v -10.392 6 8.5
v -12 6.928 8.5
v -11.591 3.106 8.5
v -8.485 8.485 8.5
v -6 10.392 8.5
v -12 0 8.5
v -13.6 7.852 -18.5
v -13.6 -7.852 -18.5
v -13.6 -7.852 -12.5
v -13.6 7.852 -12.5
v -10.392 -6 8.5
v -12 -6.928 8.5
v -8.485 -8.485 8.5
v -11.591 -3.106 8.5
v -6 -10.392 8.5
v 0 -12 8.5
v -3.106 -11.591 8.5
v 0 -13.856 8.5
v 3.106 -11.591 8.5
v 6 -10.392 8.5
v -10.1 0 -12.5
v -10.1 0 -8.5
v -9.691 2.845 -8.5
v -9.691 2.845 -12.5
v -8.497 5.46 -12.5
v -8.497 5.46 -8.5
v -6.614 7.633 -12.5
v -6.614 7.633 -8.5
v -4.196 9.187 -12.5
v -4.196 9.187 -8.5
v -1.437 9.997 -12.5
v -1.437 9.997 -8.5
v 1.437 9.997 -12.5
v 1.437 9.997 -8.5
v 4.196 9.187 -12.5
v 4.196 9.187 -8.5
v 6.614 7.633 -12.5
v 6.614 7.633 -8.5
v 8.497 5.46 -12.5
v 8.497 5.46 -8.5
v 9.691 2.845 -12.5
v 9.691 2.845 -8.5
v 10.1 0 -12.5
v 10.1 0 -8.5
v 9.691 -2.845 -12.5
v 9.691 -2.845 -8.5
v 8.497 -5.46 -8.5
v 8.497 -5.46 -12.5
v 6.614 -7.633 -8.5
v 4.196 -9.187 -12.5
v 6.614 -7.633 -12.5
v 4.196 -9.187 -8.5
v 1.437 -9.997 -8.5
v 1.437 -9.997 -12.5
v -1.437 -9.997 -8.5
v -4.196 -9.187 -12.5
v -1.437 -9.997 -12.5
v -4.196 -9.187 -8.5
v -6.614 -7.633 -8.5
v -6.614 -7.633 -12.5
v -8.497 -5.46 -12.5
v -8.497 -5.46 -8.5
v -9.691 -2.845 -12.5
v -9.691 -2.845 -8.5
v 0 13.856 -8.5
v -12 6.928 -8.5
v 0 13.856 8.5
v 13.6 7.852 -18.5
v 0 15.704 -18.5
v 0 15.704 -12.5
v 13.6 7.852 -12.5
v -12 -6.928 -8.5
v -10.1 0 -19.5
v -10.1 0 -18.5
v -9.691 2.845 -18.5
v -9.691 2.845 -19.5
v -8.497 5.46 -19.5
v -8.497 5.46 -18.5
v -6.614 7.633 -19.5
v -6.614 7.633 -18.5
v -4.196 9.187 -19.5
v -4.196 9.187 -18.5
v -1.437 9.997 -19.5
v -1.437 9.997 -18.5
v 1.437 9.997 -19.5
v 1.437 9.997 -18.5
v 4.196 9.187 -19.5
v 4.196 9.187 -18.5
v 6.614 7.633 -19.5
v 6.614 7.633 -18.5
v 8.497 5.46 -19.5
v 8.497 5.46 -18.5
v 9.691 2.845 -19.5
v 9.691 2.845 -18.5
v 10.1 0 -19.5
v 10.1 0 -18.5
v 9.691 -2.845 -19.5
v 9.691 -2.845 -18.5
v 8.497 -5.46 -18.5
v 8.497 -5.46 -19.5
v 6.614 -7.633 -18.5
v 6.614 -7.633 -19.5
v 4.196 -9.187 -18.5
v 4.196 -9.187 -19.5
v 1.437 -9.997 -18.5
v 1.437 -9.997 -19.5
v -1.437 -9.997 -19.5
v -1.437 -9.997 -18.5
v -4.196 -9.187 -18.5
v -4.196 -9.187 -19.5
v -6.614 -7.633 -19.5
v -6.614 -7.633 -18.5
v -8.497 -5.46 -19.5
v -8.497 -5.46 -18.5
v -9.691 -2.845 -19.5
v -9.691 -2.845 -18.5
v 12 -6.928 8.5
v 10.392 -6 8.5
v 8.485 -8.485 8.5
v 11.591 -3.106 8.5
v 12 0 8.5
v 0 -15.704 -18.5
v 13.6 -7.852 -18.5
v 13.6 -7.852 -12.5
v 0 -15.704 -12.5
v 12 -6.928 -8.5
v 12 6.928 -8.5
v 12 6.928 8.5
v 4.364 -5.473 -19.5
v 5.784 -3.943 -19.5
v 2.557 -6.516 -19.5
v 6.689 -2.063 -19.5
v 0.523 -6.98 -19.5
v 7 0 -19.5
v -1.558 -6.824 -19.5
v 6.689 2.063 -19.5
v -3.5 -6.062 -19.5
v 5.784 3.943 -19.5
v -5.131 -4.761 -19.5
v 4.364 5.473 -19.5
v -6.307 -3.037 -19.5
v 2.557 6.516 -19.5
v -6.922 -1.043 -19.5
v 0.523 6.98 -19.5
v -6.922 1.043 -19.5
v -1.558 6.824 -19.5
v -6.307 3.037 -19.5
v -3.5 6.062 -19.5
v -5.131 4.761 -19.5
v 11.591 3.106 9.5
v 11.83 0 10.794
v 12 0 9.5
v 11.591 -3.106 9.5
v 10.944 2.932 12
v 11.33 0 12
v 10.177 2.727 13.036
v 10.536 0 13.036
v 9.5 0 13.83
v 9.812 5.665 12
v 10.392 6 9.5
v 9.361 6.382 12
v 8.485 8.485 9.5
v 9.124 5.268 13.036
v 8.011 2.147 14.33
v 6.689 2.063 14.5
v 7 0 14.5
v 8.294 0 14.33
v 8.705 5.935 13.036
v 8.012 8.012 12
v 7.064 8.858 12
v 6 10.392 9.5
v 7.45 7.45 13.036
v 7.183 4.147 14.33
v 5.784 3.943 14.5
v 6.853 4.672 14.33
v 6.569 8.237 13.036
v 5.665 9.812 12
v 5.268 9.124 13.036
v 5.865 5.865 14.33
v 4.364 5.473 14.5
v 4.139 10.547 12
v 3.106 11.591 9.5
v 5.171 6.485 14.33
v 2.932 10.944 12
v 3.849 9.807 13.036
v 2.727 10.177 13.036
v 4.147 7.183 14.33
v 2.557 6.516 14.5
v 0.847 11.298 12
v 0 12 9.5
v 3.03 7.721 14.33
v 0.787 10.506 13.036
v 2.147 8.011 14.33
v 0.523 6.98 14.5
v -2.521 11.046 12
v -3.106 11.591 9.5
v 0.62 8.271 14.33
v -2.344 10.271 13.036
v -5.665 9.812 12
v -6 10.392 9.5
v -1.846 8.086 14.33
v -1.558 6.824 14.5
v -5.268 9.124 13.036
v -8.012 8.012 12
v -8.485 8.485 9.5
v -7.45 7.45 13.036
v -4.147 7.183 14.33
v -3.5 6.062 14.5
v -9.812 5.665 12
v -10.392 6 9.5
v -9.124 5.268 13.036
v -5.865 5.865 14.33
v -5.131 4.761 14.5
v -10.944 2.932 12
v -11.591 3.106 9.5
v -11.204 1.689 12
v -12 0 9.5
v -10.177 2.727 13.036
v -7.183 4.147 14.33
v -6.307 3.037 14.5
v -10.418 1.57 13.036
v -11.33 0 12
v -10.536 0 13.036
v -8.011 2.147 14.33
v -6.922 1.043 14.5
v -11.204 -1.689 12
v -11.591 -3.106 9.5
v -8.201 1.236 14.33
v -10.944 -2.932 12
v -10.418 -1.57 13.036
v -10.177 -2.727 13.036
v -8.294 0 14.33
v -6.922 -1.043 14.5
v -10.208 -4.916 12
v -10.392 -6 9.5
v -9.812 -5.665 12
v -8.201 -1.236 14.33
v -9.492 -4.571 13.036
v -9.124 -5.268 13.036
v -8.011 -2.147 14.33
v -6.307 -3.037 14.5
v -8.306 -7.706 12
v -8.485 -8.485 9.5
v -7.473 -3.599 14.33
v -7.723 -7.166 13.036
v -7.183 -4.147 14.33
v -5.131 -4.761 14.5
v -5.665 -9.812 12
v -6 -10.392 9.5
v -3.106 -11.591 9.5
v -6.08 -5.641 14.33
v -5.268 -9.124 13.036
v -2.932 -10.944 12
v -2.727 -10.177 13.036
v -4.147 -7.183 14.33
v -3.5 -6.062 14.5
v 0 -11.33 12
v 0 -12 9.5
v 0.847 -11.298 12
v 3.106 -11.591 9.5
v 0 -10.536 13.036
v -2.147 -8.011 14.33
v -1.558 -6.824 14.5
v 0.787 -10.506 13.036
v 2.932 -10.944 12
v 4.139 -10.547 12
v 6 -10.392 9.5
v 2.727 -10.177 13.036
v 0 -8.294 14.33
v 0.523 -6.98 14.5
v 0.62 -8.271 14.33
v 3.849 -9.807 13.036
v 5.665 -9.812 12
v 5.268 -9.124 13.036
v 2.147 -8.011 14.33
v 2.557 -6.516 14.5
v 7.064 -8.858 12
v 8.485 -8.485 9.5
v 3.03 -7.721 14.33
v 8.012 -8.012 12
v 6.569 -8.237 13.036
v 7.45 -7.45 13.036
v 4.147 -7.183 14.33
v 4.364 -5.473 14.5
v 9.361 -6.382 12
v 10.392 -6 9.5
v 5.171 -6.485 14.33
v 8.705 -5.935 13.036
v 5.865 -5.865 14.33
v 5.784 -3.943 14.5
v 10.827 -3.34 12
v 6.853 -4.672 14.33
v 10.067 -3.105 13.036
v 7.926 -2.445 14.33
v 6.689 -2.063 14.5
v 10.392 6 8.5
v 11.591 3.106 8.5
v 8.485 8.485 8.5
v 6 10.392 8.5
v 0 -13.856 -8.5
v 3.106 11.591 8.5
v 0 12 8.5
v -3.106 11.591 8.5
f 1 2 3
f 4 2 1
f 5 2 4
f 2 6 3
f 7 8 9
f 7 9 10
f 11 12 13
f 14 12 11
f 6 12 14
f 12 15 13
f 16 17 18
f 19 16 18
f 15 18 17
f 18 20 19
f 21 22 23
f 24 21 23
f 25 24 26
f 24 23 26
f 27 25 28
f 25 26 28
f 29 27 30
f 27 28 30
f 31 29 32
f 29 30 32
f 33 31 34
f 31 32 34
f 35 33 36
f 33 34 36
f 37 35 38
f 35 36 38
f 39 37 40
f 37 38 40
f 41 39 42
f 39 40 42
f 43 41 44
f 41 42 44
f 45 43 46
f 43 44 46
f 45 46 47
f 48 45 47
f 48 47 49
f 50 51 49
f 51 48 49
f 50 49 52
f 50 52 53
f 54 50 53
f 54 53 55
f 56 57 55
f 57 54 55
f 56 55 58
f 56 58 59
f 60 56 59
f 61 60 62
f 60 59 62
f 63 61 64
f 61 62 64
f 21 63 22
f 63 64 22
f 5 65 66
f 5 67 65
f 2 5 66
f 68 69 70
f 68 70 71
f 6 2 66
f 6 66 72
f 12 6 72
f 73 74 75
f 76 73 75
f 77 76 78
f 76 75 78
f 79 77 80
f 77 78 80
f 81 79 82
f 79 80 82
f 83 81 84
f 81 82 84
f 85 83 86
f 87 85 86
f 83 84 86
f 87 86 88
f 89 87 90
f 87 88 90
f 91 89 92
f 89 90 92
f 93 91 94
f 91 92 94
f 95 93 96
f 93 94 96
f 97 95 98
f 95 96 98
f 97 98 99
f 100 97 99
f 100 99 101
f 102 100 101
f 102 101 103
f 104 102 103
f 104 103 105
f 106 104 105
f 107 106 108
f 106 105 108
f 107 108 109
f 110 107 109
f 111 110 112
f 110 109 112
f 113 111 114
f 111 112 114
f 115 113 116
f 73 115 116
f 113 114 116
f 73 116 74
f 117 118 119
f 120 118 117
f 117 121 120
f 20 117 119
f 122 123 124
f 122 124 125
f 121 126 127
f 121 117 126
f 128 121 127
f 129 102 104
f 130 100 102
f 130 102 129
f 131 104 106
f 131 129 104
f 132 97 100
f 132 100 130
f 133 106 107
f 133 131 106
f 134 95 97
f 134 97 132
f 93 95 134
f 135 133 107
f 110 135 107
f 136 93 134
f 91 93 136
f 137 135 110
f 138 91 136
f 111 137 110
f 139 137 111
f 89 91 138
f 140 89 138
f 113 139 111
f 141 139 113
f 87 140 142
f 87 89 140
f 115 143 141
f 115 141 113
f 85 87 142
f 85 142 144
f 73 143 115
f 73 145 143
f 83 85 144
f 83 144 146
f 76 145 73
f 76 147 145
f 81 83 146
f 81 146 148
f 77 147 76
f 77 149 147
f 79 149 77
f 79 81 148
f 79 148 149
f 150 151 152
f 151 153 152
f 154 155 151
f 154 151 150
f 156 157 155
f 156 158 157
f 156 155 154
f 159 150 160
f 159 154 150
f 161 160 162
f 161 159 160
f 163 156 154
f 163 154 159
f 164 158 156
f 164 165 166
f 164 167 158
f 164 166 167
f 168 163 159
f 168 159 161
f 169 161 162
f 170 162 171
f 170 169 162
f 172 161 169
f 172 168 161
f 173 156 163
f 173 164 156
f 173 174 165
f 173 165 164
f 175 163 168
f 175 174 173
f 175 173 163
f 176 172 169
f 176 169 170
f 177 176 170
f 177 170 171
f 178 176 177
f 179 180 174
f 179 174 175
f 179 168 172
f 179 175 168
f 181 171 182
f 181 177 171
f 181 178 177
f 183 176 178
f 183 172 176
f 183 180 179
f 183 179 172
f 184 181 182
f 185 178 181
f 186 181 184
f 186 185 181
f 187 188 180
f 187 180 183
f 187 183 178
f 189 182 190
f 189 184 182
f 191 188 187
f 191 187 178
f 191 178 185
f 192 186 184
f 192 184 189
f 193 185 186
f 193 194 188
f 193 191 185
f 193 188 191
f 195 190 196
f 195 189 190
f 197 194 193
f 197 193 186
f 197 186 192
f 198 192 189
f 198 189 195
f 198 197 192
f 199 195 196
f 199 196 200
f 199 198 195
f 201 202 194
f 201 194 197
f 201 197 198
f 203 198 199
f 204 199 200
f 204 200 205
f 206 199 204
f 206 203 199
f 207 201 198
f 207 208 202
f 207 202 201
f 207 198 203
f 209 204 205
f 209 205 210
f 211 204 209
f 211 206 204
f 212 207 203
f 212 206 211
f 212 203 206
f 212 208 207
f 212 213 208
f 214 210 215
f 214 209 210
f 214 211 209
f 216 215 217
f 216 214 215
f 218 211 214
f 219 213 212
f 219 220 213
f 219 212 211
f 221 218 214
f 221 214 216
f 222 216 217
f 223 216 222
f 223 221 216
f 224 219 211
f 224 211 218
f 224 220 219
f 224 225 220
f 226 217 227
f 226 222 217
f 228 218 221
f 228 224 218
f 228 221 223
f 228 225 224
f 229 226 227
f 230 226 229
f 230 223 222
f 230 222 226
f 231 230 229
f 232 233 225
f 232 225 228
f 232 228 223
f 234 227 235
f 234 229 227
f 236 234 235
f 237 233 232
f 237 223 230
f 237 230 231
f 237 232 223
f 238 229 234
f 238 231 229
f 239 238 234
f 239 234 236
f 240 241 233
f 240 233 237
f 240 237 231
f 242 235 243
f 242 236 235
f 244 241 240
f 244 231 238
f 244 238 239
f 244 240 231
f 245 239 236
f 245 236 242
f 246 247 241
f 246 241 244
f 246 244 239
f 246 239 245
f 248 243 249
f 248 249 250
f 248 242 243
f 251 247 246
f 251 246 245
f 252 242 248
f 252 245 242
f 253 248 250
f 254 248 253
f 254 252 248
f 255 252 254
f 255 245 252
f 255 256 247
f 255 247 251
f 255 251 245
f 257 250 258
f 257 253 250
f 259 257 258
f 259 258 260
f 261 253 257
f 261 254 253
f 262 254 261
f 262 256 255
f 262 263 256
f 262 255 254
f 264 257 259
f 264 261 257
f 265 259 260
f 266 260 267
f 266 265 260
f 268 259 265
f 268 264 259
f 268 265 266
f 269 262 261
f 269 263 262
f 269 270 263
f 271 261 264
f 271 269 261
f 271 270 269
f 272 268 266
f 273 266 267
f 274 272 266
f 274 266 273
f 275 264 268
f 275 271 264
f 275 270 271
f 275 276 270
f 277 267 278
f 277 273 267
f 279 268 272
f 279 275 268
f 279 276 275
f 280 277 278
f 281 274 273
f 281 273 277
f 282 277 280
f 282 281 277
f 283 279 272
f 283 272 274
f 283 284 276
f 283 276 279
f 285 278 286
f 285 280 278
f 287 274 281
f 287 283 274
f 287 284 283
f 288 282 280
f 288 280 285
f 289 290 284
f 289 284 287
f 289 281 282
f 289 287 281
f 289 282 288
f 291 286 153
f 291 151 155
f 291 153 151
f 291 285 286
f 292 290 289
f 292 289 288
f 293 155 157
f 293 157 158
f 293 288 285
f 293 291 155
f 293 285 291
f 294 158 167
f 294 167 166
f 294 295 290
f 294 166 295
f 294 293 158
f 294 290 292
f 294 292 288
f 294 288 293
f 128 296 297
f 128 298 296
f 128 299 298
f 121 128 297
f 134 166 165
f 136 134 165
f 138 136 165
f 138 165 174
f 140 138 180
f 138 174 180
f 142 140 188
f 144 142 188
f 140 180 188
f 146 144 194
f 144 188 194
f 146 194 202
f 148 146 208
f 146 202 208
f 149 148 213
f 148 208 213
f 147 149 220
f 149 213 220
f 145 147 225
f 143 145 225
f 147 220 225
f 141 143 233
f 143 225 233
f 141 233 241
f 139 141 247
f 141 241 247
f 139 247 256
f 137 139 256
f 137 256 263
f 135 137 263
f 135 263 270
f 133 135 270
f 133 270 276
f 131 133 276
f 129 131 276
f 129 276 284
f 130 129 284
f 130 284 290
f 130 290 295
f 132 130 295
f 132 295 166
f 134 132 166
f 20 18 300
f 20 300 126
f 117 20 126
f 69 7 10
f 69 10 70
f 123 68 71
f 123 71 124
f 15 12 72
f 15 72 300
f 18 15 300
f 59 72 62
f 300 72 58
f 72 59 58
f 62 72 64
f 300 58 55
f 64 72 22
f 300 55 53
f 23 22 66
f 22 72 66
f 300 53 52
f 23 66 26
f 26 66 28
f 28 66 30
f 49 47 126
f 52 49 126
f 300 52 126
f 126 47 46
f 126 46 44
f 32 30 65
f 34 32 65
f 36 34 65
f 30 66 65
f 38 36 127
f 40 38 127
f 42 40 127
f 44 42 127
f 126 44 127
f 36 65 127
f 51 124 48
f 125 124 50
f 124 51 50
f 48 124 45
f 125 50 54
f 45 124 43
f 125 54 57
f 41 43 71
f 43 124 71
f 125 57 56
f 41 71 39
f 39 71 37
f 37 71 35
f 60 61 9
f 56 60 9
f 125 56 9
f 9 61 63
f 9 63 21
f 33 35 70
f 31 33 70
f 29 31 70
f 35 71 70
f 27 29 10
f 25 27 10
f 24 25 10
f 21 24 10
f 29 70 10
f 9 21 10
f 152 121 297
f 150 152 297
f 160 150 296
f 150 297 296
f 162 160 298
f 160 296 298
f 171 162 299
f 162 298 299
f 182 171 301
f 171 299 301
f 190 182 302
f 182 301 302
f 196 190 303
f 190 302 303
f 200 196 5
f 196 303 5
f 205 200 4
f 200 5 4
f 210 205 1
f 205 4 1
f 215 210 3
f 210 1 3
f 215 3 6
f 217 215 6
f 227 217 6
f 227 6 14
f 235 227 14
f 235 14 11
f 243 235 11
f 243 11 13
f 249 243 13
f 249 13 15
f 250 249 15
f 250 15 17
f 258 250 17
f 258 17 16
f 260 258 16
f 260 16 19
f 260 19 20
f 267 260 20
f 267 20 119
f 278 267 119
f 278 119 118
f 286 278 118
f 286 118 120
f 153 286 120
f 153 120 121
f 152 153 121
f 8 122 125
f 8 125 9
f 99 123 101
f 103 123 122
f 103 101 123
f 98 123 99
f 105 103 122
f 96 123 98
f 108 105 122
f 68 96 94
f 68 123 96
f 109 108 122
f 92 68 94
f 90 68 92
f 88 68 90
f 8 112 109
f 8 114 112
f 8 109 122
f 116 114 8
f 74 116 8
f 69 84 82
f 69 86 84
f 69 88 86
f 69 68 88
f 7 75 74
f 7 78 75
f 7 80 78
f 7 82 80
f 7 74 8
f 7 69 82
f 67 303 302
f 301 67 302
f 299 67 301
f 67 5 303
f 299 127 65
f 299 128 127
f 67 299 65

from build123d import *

# Parameters (mm, degrees)
RESSALTO_EXTRUS_O1_DEPTH = 8.5
ESBO_O2_R                = 12
RESSALTO_EXTRUS_O2_DEPTH = 6
FILETE1_R                = 5
ESBO_O3_R                = 10.1
RESSALTO_EXTRUS_O3_DEPTH = 10
RESSALTO_EXTRUS_O4_DEPTH = 6
ESBO_O5_R                = 10.1
RESSALTO_EXTRUS_O5_DEPTH = 1
CORTE_EXTRUS_O1_REACH    = 36
ESBO_O6_R                = 7


with BuildPart() as part:
    # Esboço1 → Ressalto-extrusão1 (new body, symmetric)
    with BuildSketch(Plane.XY):
        Polygon((0, 13.856406461), (-12, 6.92820323), (-12, -6.92820323), (0, -13.856406461), (12, -6.92820323), (12, 6.92820323), align=None)
    extrude(amount=RESSALTO_EXTRUS_O1_DEPTH, both=True)

    # Esboço2 → Ressalto-extrusão2 (add)
    with BuildSketch(Plane.XY.offset(8.5)):
        Circle(ESBO_O2_R)
    extrude(amount=RESSALTO_EXTRUS_O2_DEPTH)

    # Filete1
    filete1_edges = [part.edges().sort_by_distance(p)[0] for p in [
        (-12, 0, 14.5),
    ]]
    fillet(filete1_edges, radius=FILETE1_R)

    # Esboço3 → Ressalto-extrusão3 (add)
    with BuildSketch(Plane(origin=(0, 0, -8.5), x_dir=(-1, 0, 0), z_dir=(0, 0, -1))):
        Circle(ESBO_O3_R)
    extrude(amount=RESSALTO_EXTRUS_O3_DEPTH)

    # Esboço4 → Ressalto-extrusão4 (add)
    with BuildSketch(Plane(origin=(0, 0, -18.5), x_dir=(-1, 0, 0), z_dir=(0, 0, -1))):
        Polygon((0, 15.703927322), (-13.6, 7.851963661), (-13.6, -7.851963661), (0, -15.703927322), (13.6, -7.851963661), (13.6, 7.851963661), align=None)
    extrude(amount=-RESSALTO_EXTRUS_O4_DEPTH)

    # Esboço5 → Ressalto-extrusão5 (add)
    with BuildSketch(Plane(origin=(0, 0, -18.5), x_dir=(-1, 0, 0), z_dir=(0, 0, -1))):
        Circle(ESBO_O5_R)
    extrude(amount=RESSALTO_EXTRUS_O5_DEPTH)

    # Esboço6 → Corte-extrusão1 (cut, up to next)
    with BuildSketch(Plane.XY.offset(14.5), mode=Mode.PRIVATE) as corte_extrus_o1_sk1:
        Circle(ESBO_O6_R)
    corte_extrus_o1_tool1 = extrude(corte_extrus_o1_sk1.sketch, amount=-CORTE_EXTRUS_O1_REACH, mode=Mode.PRIVATE) & part.part
    add(corte_extrus_o1_tool1.solids().sort_by_distance((0, 0, 14.5))[0], mode=Mode.SUBTRACT)


solid = part.part
